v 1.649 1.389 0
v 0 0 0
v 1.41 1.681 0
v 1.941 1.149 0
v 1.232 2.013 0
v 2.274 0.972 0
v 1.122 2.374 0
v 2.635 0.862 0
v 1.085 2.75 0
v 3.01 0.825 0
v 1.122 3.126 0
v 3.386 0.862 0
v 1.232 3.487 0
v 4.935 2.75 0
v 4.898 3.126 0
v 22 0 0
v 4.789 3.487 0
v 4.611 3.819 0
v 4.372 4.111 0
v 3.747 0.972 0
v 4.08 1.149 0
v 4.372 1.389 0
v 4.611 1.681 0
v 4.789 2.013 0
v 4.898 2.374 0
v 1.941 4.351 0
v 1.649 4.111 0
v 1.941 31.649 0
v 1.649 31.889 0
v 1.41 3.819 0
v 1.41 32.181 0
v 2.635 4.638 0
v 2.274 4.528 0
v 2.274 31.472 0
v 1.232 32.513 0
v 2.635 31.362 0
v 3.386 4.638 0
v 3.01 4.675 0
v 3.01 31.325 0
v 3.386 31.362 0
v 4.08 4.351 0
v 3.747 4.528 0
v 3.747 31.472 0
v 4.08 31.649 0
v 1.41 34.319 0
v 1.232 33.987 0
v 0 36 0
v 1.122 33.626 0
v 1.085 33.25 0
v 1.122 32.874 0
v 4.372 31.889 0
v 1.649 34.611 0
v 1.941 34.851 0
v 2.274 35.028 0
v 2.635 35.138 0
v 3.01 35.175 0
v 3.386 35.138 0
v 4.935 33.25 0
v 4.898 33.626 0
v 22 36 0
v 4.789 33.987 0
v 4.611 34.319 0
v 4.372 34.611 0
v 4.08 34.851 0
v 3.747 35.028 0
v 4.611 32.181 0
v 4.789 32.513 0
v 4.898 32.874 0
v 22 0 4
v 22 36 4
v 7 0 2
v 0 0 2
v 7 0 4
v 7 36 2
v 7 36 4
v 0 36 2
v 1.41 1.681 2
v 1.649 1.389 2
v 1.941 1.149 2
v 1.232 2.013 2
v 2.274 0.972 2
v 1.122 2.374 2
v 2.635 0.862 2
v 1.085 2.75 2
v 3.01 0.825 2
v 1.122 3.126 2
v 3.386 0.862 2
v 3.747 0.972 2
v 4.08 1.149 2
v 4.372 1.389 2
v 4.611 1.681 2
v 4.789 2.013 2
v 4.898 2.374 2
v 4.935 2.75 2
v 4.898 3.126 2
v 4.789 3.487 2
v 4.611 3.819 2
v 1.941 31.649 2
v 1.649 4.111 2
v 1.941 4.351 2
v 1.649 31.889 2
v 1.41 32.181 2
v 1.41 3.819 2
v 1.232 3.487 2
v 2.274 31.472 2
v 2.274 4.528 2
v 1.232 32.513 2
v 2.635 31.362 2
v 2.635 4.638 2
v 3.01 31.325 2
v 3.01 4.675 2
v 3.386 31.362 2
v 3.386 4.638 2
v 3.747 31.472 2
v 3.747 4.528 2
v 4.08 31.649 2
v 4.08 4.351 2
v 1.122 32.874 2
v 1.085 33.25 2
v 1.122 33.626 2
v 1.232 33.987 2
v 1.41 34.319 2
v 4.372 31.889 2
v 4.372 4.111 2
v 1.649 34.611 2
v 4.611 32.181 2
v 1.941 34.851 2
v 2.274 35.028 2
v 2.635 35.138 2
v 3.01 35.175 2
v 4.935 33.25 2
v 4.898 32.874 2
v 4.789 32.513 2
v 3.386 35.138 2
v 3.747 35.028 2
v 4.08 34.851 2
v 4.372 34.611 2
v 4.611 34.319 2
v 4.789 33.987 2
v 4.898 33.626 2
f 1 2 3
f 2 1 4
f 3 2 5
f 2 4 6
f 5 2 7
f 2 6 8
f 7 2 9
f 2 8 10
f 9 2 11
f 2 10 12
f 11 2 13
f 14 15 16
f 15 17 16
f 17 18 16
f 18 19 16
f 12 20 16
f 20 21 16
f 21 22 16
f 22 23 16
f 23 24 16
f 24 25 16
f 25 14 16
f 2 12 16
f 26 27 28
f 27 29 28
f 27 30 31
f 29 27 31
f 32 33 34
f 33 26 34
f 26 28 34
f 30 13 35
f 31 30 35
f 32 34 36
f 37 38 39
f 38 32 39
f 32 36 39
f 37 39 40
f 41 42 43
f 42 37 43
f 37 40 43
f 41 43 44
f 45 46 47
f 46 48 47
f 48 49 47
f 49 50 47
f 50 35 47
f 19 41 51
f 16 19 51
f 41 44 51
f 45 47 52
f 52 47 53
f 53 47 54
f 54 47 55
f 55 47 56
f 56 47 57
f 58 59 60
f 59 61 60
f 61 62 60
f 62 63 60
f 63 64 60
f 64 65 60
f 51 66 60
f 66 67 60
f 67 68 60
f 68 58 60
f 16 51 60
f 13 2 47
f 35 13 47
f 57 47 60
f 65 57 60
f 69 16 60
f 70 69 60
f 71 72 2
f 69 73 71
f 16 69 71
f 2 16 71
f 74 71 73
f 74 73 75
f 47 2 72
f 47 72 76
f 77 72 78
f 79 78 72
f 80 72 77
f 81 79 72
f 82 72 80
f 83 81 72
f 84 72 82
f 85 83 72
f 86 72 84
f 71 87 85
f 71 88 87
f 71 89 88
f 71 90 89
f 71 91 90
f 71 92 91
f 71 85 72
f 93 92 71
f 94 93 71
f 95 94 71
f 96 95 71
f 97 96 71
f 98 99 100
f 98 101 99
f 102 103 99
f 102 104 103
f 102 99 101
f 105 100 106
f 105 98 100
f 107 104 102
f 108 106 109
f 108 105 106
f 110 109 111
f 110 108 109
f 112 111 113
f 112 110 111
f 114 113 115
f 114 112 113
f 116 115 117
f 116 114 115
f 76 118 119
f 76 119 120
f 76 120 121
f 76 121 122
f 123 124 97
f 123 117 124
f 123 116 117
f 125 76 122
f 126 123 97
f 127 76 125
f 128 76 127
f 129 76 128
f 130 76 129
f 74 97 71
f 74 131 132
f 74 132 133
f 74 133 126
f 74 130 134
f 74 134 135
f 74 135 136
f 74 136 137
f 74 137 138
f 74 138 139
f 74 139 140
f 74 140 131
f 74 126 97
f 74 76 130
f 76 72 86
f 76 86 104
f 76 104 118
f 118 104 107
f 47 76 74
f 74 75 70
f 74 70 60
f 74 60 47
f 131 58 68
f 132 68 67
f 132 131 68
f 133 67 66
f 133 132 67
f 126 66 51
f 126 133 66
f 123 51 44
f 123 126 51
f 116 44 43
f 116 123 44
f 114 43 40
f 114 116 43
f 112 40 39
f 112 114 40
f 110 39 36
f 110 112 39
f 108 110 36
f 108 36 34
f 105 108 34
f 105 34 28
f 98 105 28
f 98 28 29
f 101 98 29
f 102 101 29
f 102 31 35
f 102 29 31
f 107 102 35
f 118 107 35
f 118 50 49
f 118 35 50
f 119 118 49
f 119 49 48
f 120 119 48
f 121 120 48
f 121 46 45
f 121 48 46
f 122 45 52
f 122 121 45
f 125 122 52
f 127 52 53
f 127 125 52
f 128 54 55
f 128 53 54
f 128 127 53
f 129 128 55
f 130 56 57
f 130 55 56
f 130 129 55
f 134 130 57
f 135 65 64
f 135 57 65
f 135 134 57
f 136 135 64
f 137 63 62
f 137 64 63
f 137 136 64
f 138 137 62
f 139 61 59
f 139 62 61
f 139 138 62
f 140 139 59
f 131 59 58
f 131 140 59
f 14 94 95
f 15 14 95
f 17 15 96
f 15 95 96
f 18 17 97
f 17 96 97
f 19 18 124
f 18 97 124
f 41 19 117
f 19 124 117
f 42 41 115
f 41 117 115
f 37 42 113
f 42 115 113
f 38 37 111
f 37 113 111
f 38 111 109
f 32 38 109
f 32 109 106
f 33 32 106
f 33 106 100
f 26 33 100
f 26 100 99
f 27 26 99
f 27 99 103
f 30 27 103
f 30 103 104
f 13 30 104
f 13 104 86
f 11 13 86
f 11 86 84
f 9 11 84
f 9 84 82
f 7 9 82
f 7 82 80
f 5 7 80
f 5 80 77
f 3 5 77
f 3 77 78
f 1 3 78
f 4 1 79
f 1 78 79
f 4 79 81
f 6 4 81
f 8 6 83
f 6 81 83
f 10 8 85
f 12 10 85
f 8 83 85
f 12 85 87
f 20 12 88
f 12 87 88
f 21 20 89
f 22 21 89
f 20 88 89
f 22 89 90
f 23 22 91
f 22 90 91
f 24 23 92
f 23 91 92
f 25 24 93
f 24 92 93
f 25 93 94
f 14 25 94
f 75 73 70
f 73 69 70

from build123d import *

# Parameters (mm, degrees)
SKETCH_W       = 22
SKETCH_H       = 36
PAD_DEPTH      = 2
SKETCH001_R    = 1.925
HOLE_DEPTH     = 86.475848
PAD001_DEPTH   = 2
PAD001_FACE8_W = 32
PAD001_FACE8_H = 2
PAD002_DEPTH   = 10
PAD002_FACE9_W = 36
PAD002_FACE9_H = 2
PAD003_DEPTH   = 3


with BuildPart() as part:
    # Sketch → Pad (new body)
    with BuildSketch(Plane.XY):
        with Locations((11, 18)):
            Rectangle(SKETCH_W, SKETCH_H)
    extrude(amount=PAD_DEPTH)

    # Sketch001 (on Face6 of Pad) → Hole (cut, through all)
    with BuildSketch(Plane.XY.offset(2)):
        with Locations((3.010433, 2.75)):
            Circle(SKETCH001_R)
    hole = extrude(amount=-HOLE_DEPTH, mode=Mode.SUBTRACT)

    # Mirrored: Hole across Sketch001 Axis0
    add(hole.mirror(Plane(origin=(0, 18, 2), x_dir=(0, 0, 1), z_dir=(0, 1, 0))), mode=Mode.SUBTRACT)

    # Sketch002 (on Face5 of Mirrored) → Pad001 (join)
    with BuildSketch(Plane.XY.offset(2)):
        Polygon((10, 36), (10, 34), (20, 34), (20, 2), (10, 2), (10, 0), (22, 0), (22, 36), align=None)
    extrude(amount=PAD001_DEPTH)

    # Pad001 Face8 → Pad002 (add)
    with BuildSketch(Plane(origin=(20, 18, 3), x_dir=(0, 1, 0), z_dir=(-1, 0, 0))):
        Rectangle(PAD001_FACE8_W, PAD001_FACE8_H)
    extrude(amount=PAD002_DEPTH)

    # Pad002 Face9 → Pad003 (add)
    with BuildSketch(Plane(origin=(10, 18, 3), x_dir=(0, 1, 0), z_dir=(-1, 0, 0))):
        Rectangle(PAD002_FACE9_W, PAD002_FACE9_H)
    extrude(amount=PAD003_DEPTH)


solid = part.part
